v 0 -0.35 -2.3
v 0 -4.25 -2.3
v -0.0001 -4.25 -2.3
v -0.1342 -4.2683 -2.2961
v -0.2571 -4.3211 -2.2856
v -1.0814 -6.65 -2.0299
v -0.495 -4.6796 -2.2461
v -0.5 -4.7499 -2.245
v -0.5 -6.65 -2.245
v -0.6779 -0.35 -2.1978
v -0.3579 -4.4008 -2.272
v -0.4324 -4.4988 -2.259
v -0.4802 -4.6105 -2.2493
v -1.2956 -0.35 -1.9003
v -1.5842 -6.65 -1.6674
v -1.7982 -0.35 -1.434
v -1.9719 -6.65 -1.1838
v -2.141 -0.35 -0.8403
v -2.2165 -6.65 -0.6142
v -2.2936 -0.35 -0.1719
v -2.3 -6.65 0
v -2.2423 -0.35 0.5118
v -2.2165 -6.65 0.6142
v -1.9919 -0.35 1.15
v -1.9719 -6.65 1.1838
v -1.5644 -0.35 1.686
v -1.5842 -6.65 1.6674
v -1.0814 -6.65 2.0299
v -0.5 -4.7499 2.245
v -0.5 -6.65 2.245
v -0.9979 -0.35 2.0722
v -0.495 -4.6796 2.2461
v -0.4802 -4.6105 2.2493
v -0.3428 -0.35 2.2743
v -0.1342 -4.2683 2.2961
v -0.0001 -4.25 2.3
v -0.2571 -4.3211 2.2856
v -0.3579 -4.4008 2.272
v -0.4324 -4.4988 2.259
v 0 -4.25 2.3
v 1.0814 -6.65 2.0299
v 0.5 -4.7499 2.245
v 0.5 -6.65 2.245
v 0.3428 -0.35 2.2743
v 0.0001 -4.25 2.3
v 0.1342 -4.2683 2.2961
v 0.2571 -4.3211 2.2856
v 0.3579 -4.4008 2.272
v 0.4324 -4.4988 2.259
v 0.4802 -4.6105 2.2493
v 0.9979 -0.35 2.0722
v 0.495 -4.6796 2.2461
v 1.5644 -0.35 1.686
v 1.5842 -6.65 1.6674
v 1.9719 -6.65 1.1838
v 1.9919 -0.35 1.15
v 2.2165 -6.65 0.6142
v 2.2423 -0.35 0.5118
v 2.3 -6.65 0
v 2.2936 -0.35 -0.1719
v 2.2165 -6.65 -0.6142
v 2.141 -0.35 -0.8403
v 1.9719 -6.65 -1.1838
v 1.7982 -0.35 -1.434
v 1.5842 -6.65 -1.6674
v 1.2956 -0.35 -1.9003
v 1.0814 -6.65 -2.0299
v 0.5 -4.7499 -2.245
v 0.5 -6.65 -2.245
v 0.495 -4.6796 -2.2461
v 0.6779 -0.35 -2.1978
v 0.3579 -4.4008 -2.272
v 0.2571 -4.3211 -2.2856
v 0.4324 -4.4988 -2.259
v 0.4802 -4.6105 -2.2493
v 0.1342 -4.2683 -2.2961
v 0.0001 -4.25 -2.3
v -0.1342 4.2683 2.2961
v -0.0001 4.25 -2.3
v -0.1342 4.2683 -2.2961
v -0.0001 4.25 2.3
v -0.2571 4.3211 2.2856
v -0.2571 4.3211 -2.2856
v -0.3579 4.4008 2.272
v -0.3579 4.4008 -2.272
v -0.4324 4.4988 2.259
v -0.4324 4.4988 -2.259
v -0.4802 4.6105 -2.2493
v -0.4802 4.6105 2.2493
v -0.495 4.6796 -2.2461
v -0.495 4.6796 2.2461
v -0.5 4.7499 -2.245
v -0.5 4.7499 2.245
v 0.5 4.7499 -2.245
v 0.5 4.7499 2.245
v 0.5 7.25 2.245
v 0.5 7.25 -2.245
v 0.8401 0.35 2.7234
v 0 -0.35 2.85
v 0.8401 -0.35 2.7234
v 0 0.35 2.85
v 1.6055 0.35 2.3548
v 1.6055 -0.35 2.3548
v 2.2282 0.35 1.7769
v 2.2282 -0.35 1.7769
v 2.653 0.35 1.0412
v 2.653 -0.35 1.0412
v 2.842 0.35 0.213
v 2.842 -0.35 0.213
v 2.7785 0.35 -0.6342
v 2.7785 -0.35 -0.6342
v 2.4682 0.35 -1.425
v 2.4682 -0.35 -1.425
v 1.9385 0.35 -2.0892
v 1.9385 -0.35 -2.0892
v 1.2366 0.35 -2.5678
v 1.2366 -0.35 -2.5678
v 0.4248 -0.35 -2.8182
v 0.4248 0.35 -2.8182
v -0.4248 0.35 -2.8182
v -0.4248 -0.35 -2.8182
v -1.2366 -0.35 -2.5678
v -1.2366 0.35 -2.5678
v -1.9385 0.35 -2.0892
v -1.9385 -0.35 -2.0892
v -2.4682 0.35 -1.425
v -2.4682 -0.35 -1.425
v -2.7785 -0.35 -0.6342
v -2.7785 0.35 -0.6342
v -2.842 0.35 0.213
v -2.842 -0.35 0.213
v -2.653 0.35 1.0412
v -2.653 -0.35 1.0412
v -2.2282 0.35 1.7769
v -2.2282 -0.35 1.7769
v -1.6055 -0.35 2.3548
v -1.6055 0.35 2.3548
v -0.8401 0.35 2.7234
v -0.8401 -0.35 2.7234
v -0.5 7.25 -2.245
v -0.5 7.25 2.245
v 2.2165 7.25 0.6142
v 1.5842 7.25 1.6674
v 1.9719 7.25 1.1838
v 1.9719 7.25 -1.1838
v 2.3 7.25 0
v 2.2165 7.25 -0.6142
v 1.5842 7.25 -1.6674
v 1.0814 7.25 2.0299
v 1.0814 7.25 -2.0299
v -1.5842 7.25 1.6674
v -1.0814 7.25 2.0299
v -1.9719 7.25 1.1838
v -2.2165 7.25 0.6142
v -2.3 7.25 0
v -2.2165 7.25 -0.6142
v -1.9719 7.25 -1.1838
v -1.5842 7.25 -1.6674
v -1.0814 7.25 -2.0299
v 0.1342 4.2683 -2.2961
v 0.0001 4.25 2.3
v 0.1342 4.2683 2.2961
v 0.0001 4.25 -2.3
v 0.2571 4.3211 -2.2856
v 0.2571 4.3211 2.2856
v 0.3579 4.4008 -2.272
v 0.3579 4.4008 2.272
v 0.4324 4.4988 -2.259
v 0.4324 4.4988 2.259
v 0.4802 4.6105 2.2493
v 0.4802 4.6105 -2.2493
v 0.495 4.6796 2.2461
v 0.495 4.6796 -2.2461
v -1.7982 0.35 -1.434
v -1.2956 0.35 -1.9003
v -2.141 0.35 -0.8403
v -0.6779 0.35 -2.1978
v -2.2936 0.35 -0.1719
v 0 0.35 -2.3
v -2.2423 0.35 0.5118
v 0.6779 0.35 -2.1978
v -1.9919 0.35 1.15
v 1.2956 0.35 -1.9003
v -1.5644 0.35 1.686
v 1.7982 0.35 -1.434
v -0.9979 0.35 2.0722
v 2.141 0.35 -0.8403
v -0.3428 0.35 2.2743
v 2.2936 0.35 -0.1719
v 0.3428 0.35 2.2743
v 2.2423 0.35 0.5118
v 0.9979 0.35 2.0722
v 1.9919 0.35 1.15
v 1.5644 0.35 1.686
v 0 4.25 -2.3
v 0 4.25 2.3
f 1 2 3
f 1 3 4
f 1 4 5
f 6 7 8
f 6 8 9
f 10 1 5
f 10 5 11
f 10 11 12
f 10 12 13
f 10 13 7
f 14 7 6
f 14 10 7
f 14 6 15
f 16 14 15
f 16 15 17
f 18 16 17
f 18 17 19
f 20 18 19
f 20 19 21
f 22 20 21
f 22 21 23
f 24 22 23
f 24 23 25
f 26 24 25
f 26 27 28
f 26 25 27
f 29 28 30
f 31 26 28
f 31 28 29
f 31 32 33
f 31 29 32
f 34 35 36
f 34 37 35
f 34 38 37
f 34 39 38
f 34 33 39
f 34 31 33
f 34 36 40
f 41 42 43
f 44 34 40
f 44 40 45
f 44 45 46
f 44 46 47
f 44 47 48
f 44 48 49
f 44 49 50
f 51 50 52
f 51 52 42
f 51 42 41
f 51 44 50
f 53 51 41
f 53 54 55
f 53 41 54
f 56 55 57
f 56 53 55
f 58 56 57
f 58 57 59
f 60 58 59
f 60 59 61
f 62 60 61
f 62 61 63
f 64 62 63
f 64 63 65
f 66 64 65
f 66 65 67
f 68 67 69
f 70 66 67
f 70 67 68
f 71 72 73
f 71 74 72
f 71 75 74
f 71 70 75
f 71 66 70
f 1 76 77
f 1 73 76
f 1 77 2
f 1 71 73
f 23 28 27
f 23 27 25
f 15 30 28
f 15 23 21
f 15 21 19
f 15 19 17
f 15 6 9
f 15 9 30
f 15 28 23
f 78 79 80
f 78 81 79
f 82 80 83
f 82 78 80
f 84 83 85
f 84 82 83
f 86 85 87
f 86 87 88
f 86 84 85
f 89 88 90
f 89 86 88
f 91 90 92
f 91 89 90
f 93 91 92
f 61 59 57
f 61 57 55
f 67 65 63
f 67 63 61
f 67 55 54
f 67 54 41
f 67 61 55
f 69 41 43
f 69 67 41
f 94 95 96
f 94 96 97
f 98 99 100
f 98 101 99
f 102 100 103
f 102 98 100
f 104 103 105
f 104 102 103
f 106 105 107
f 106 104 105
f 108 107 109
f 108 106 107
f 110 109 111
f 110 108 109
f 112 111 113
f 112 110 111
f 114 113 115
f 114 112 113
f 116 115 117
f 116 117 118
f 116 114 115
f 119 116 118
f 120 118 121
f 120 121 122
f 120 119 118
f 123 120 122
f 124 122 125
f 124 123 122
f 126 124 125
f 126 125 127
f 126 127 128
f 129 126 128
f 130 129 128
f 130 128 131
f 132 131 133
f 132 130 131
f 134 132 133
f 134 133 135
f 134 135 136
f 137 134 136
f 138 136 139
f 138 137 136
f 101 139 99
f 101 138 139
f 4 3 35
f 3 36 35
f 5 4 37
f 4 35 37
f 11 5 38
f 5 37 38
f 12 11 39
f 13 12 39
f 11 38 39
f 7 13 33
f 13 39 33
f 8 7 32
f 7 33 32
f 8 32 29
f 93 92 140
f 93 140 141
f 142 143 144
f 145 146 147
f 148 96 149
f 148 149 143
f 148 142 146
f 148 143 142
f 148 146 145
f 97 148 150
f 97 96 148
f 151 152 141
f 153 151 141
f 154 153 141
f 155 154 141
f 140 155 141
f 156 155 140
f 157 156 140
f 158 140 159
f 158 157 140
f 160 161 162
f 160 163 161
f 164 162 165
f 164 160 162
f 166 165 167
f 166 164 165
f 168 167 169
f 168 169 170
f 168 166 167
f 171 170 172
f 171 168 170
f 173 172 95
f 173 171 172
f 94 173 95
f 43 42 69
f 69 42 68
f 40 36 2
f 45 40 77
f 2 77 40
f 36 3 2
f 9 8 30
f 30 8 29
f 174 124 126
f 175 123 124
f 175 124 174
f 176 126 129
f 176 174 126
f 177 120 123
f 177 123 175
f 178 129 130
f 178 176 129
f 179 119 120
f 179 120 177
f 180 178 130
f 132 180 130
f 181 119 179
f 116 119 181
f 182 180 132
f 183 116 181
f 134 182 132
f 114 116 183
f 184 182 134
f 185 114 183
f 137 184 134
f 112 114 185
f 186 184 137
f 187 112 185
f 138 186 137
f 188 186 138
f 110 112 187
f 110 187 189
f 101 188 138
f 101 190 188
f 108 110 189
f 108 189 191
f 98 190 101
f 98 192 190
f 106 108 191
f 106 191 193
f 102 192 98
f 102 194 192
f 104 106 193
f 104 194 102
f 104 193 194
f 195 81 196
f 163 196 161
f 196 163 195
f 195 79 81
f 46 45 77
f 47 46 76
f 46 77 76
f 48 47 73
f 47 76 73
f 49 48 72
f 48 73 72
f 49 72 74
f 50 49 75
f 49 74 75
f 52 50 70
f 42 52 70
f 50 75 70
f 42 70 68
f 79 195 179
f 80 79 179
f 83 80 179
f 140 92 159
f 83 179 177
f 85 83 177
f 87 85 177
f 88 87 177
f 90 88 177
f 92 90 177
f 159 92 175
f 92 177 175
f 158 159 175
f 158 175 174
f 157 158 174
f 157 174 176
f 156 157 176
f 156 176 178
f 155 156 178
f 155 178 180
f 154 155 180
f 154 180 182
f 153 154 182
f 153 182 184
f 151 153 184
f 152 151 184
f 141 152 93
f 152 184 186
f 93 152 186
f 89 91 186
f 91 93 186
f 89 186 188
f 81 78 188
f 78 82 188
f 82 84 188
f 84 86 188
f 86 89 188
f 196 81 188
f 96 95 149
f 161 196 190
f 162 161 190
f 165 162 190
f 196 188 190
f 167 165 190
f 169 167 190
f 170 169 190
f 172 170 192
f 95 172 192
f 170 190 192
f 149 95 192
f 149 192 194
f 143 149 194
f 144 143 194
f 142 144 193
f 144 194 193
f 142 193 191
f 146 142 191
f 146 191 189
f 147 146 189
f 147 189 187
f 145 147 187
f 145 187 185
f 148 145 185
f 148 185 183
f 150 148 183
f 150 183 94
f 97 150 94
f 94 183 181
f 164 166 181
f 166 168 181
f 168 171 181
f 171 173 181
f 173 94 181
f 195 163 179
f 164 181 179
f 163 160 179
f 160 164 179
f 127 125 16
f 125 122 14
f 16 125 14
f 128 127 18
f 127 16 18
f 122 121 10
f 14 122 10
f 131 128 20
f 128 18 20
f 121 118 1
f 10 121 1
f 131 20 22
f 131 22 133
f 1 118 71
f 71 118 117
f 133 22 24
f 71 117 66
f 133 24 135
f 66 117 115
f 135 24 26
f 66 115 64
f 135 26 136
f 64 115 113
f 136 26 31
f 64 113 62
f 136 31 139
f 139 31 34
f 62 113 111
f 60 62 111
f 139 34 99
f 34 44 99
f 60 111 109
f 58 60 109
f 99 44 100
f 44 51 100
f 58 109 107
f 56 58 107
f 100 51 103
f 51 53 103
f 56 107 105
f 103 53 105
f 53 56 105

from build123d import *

# Parameters (mm, degrees)
SKETCH2_R            = 2.85
BOSS_EXTRUDE1_DEPTH  = 0.35
SKETCH4_R            = 2.3
BOSS_EXTRUDE2_DEPTH  = 6.9
CUT_EXTRUDE1_START   = -3
CUT_EXTRUDE1_DEPTH   = 3
FILLET1_R            = 0.5
FILLET1_OF_MIRROR1_R = 0.5
CUT_EXTRUDE2_DEPTH   = 0.6


with BuildPart() as part:
    # Sketch2 → Boss-Extrude1 (new body)
    with BuildSketch(Plane(origin=(0, 0, 0), x_dir=(1, 0, 0), z_dir=(0, 1, 0))):
        with Locations(Location((0, 0, 0), (0, 0, 270))):
            Circle(SKETCH2_R)
    boss_extrude1 = extrude(amount=BOSS_EXTRUDE1_DEPTH)

    # Sketch4 → Boss-Extrude2 (add)
    with BuildSketch(Plane(origin=(0, 0.35, 0), x_dir=(1, 0, 0), z_dir=(0, 1, 0))):
        with Locations(Location((0, 0, 0), (0, 0, 90))):
            Circle(SKETCH4_R)
    boss_extrude2 = extrude(amount=BOSS_EXTRUDE2_DEPTH)

    # Sketch5 → Cut-Extrude1 (cut)
    with BuildSketch(Plane(origin=(0, 7.25, 0), x_dir=(1, 0, 0), z_dir=(0, 1, 0)).offset(CUT_EXTRUDE1_START)):
        with BuildLine():
            Line((-0.5, 2.244994432), (-0.5, -2.244994432))
            ThreePointArc((-0.5, -2.244994432), (0, -2.3), (0.5, -2.244994432))
            Line((0.5, -2.244994432), (0.5, 2.244994432))
            ThreePointArc((0.5, 2.244994432), (0, 2.3), (-0.5, 2.244994432))
        make_face()
    cut_extrude1 = extrude(amount=CUT_EXTRUDE1_DEPTH, mode=Mode.SUBTRACT)

    # Fillet1
    fillet1_edges = [part.edges().sort_by_distance(p)[0] for p in [
        (0.5, 4.25, 0),
        (-0.5, 4.25, 0),
    ]]
    fillet(fillet1_edges, radius=FILLET1_R - 0.0001)  # a hair under: the kernel refuses the full size

    # Mirror1: Boss-Extrude1, Boss-Extrude2, Cut-Extrude1 across plane
    add(boss_extrude1.mirror(Plane.ZX))
    add(boss_extrude2.mirror(Plane.ZX))
    add(cut_extrude1.mirror(Plane.ZX), mode=Mode.SUBTRACT)

    # Fillet1 of Mirror1
    fillet1_of_mirror1_edges = [part.edges().sort_by_distance(p)[0] for p in [
        (0.5, -4.25, 0),
        (-0.5, -4.25, 0),
    ]]
    fillet(fillet1_of_mirror1_edges, radius=FILLET1_OF_MIRROR1_R - 0.0001)  # a hair under: the kernel refuses the full size

    # Sketch6 → Cut-Extrude2 (cut)
    with BuildSketch(Plane(origin=(0, -7.25, 0), x_dir=(-1, 0, 0), z_dir=(0, -1, 0))):
        with BuildLine():
            ThreePointArc((0.5, -2.244994432), (2.244994432, 0.5), (-0.5, 2.244994432))
            ThreePointArc((-0.5, 2.244994432), (-2.244994432, -0.5), (0.5, -2.244994432))
        make_face()
    extrude(amount=-CUT_EXTRUDE2_DEPTH, mode=Mode.SUBTRACT)


solid = part.part
